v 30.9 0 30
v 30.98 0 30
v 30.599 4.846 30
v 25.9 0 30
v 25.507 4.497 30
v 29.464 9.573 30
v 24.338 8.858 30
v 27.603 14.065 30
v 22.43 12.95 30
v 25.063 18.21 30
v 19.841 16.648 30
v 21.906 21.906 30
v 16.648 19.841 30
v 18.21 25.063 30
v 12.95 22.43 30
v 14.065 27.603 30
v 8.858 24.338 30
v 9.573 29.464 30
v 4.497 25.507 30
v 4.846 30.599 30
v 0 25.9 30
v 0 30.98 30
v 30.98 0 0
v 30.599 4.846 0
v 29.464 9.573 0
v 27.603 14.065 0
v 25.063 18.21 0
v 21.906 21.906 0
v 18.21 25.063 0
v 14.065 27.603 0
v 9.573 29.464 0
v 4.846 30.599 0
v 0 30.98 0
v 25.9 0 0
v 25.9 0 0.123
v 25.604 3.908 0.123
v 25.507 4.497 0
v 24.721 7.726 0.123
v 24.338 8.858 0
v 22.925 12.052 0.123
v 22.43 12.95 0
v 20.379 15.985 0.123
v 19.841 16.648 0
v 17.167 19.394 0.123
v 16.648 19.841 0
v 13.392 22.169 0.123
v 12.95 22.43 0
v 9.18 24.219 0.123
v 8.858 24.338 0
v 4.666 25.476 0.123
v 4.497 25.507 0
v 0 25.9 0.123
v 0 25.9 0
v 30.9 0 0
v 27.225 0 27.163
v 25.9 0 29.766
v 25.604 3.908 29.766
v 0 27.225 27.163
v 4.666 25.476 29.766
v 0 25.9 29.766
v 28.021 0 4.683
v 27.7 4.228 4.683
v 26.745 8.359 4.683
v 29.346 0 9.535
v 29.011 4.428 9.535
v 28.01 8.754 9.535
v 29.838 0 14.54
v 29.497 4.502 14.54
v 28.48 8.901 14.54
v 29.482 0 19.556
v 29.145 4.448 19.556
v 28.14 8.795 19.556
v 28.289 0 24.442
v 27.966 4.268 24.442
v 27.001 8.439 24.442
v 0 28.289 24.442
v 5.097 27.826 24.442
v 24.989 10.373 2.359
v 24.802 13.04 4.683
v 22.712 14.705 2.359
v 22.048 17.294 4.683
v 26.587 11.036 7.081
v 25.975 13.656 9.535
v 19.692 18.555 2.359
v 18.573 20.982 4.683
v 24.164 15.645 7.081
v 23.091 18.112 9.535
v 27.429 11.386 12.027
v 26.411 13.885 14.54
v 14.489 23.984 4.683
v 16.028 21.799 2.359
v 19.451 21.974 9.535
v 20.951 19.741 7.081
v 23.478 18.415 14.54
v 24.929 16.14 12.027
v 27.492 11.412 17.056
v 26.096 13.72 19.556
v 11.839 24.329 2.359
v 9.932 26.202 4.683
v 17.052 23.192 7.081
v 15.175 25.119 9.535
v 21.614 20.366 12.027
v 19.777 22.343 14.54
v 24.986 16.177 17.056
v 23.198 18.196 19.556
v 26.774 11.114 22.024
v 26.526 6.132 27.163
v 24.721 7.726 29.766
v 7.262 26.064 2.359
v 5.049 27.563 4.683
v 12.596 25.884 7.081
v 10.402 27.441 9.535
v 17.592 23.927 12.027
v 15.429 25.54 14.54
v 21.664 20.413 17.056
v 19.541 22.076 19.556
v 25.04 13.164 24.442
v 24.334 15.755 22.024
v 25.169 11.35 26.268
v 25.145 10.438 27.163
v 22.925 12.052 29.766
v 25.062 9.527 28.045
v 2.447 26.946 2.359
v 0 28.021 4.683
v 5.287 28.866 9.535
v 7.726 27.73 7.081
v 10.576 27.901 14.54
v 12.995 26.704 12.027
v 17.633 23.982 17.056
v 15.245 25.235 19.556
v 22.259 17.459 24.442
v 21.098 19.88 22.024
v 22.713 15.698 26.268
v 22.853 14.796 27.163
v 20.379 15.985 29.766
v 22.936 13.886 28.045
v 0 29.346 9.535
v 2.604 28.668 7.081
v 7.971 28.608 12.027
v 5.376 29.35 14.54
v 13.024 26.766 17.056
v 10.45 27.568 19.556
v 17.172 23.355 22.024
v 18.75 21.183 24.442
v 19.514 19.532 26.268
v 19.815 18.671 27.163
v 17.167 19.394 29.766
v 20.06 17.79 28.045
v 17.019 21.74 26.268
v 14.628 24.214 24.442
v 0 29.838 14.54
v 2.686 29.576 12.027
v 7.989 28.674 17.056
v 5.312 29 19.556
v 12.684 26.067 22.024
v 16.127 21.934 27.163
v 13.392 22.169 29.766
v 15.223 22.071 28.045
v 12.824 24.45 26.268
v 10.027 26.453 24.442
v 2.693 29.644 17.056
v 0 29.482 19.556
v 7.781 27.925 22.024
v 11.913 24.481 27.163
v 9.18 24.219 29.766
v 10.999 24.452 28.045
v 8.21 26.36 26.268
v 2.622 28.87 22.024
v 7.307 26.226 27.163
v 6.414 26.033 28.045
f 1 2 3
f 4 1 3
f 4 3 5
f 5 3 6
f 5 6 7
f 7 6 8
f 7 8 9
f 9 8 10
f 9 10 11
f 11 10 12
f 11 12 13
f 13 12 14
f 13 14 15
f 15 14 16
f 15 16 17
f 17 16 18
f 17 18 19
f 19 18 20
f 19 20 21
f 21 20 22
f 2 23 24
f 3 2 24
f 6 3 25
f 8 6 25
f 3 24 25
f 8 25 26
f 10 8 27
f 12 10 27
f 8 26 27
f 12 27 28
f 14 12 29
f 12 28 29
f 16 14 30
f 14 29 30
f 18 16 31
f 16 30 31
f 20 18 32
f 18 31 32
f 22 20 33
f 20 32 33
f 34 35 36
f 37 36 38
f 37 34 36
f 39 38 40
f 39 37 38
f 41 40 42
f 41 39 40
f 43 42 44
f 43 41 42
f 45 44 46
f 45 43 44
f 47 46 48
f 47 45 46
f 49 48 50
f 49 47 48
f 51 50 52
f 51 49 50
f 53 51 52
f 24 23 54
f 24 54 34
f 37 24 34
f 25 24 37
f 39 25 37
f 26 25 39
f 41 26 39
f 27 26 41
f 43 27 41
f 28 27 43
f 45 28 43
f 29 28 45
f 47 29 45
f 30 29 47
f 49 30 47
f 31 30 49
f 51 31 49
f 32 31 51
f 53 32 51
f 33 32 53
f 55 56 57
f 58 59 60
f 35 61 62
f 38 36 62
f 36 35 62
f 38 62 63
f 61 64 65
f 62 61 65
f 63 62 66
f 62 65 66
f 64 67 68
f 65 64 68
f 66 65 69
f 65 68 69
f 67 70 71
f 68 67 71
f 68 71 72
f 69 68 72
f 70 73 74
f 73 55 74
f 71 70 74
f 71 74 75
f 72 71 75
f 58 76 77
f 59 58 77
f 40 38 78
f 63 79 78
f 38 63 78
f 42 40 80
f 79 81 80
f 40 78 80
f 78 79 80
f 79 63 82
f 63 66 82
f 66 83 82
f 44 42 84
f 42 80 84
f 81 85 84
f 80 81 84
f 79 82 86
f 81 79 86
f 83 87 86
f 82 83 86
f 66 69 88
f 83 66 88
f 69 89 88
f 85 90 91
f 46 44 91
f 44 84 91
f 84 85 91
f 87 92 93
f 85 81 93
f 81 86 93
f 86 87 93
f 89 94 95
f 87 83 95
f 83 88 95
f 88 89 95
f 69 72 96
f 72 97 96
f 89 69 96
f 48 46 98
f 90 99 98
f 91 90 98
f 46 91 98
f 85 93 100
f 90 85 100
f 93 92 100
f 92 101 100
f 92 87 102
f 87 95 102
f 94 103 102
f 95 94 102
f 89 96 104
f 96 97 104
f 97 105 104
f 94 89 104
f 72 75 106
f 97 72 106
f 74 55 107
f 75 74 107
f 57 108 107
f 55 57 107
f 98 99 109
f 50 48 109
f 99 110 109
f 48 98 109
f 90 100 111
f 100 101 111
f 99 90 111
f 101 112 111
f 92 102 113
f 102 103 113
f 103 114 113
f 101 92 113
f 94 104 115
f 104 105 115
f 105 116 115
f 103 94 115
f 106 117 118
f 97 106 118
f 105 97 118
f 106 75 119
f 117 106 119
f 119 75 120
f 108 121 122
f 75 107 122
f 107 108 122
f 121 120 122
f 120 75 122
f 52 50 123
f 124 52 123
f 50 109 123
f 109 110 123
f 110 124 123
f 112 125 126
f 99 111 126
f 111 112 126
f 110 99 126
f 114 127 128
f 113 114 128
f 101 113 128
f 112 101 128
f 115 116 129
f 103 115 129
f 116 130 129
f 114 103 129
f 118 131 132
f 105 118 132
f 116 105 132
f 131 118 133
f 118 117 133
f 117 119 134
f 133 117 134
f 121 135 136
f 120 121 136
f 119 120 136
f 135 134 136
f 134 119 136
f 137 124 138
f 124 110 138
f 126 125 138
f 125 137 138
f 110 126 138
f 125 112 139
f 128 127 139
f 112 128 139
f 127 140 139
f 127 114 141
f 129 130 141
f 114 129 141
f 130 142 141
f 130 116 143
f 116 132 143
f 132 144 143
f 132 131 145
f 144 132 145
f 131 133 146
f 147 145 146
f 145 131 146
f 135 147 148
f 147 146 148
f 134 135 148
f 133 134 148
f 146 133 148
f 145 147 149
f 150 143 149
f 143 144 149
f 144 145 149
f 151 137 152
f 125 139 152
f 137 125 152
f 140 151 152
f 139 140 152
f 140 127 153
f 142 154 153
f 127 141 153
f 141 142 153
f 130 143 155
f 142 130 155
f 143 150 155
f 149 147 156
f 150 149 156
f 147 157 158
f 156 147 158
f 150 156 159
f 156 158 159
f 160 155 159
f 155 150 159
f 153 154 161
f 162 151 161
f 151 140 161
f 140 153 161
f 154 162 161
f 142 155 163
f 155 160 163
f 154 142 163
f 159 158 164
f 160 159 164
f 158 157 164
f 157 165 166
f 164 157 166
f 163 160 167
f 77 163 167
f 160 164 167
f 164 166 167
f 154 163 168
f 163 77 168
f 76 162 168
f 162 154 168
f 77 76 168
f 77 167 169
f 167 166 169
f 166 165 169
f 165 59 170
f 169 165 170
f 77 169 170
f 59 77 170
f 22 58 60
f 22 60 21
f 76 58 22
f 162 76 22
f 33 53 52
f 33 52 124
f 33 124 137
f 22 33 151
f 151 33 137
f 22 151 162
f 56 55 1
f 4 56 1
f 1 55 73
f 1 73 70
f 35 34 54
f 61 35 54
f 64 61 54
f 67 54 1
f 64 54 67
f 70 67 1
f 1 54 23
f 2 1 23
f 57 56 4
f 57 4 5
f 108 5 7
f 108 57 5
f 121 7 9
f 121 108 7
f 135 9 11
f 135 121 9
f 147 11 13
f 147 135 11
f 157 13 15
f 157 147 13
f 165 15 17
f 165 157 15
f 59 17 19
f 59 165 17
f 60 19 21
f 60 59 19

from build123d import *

# Parameters (mm, degrees)
PAD_DEPTH = 30
BOX_W     = 10
BOX_H     = 10
BOX_DEPTH = 10


with BuildPart() as part:
    # Sketch (on XY_Plane of Origin) → Pad (new body)
    with BuildSketch(Plane.XY):
        with BuildLine():
            ThreePointArc((25.9, 8e-06), (18.314063, 18.314069), (0, 25.9))
            Line((0, 25.9), (0, 30.9))
            Line((0, 30.9), (0, 30.98))
            ThreePointArc((30.98, 0), (21.906168, 21.906168), (0, 30.98))
            Line((30.9, 0), (30.98, 0))
            Line((25.9, 8e-06), (30.9, 0))
        make_face()
    extrude(amount=PAD_DEPTH)

    # Box → Box (cut)
    with BuildSketch(Plane.XY):
        with Locations((5, 5)):
            Rectangle(BOX_W, BOX_H)
    extrude(amount=BOX_DEPTH, mode=Mode.SUBTRACT)

    # Sketch001 (on XZ_Plane of Origin) → Groove (revolve, cut)
    with BuildSketch(Plane.XZ):
        with BuildLine():
            ThreePointArc((25.828939, 0), (29.840979, 14.944895), (25.828939, 29.88979))
            Line((25.828939, 29.88979), (25.828939, 0))
        make_face()
    revolve(axis=Axis((0, 0, 0), (0, 0, 1)), mode=Mode.SUBTRACT)


solid = part.part
